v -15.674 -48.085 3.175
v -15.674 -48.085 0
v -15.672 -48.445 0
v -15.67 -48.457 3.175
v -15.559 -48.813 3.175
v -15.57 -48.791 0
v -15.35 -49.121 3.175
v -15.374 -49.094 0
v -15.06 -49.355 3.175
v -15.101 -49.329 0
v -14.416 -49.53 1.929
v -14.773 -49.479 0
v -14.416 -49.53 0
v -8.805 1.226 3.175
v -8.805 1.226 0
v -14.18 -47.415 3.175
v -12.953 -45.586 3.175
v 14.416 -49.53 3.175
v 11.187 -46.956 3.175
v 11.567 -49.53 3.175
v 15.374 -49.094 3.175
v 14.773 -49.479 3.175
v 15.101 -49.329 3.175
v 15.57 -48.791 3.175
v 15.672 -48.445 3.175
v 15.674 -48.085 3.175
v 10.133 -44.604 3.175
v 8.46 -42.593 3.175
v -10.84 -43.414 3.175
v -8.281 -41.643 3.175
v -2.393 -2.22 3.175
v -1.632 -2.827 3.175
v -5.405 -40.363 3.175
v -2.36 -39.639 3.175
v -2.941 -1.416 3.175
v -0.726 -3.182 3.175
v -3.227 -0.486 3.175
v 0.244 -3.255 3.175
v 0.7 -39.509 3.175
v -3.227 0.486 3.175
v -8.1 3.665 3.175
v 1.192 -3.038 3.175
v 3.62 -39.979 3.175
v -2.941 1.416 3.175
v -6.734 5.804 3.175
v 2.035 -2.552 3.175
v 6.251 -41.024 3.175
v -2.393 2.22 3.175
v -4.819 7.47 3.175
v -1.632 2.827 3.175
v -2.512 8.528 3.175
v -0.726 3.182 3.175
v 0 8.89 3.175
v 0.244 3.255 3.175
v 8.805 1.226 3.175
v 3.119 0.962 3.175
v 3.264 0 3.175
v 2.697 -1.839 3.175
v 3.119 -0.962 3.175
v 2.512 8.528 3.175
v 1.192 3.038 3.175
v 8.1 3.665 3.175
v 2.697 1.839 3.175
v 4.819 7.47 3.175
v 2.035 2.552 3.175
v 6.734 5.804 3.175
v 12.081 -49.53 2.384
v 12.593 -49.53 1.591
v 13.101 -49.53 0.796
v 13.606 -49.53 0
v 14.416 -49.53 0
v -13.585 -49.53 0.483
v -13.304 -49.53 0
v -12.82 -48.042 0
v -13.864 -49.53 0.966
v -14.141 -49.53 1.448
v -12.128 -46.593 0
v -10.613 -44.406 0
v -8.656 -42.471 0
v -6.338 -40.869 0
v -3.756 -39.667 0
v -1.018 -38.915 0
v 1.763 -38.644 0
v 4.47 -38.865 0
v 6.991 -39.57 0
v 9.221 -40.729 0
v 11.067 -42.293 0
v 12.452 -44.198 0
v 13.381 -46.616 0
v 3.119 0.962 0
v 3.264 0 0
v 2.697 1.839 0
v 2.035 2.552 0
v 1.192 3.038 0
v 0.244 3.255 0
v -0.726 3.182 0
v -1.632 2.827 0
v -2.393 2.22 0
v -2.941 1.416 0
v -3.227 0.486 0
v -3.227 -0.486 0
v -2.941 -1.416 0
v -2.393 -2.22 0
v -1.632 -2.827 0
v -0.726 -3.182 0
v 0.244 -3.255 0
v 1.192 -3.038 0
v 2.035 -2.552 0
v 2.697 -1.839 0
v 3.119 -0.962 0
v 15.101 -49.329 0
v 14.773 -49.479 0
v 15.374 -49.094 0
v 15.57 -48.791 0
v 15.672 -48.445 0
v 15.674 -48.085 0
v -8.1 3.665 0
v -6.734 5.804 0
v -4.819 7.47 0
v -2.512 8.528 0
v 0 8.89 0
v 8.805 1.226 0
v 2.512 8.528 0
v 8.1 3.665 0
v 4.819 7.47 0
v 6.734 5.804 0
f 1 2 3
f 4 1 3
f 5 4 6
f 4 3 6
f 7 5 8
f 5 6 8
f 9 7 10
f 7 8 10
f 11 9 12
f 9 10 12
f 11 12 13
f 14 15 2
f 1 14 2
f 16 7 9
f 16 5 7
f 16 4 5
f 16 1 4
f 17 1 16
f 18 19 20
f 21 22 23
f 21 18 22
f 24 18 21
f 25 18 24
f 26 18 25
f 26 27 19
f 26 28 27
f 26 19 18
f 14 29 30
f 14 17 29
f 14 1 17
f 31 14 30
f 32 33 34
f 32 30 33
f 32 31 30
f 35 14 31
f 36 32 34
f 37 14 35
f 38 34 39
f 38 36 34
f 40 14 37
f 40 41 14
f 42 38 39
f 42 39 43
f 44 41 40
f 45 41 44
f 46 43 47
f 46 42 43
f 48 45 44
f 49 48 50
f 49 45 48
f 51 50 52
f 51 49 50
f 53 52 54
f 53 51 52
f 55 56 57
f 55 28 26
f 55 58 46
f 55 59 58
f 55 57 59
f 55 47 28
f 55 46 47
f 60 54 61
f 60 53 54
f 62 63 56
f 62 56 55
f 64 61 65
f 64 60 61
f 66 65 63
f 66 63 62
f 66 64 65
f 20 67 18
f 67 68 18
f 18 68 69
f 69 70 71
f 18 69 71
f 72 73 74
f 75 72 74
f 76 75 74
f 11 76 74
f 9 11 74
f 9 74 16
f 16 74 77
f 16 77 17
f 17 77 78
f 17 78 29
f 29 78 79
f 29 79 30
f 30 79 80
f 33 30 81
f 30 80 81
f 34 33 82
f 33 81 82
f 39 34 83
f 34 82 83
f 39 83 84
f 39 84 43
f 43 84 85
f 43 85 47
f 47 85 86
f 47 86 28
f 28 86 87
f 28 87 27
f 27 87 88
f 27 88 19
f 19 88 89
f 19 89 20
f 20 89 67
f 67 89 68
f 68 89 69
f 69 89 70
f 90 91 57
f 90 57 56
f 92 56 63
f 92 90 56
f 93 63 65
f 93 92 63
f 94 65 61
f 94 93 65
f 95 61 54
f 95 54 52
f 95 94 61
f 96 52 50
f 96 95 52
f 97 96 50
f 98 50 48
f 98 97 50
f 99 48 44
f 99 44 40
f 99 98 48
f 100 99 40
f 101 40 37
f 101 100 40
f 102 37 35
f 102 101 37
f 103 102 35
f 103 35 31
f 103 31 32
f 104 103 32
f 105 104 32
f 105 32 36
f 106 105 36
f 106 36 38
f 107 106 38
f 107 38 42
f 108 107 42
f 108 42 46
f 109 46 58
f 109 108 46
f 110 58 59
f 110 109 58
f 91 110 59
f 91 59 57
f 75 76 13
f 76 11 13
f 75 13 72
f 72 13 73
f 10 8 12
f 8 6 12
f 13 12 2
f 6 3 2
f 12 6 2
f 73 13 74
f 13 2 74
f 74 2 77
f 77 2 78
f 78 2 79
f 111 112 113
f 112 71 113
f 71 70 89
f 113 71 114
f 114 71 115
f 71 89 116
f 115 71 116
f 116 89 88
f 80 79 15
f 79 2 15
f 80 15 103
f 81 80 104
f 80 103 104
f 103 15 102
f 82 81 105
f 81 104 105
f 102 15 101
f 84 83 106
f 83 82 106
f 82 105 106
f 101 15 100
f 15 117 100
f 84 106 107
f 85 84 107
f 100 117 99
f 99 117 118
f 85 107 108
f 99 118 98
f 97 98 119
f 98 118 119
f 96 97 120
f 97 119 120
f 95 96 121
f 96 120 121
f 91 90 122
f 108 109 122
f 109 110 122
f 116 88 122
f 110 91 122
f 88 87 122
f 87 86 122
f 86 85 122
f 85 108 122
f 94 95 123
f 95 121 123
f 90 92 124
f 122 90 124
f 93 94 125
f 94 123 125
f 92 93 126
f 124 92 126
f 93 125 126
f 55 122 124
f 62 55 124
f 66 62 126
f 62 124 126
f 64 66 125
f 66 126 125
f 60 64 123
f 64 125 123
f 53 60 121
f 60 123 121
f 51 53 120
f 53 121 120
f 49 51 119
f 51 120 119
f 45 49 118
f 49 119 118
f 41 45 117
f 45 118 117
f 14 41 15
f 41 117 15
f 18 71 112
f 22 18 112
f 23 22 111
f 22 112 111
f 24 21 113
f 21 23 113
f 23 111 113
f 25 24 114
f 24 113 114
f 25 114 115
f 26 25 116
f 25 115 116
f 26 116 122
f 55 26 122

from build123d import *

# Parameters (mm, degrees)
SKETCH1_R           = 3.2639
BOSS_EXTRUDE1_DEPTH = 3.175
CAVITY1_OUTLINE_W   = 11.43
CAVITY1_OUTLINE_H   = 18.479477922
FILLET2_R           = 1.27


# Read off the part's stored shape, not the designer's step: Cavity1
with BuildPart() as part:
    # Sketch1 → Boss-Extrude1 (new body)
    with BuildSketch(Plane.XY):
        with BuildLine():
            ThreePointArc((8.804991066, 1.226471495), (0, 8.89), (-8.804991066, 1.226471495))
            Line((-8.804991066, 1.226471495), (-15.875, -49.53))
            Line((-15.875, -49.53), (15.875, -49.53))
            Line((15.875, -49.53), (8.804991066, 1.226471495))
        make_face()
        Circle(SKETCH1_R, mode=Mode.SUBTRACT)
    extrude(amount=BOSS_EXTRUDE1_DEPTH)

    # Cavity1 outline → Cavity1 (revolve, cut)
    with BuildSketch(Plane(origin=(5.822510153, -48.093039184, -8.961753145), x_dir=(0.8468434564524782, -0.1362359794546486, 0.5140971874710584), z_dir=(0, 0.9666347575686124, 0.2561586333900735))):
        with Locations((5.715, -12.145132975)):
            Rectangle(CAVITY1_OUTLINE_W, CAVITY1_OUTLINE_H)
    revolve(axis=Axis((5.822510153, -48.093039184, -8.961753145), (0.5318422324934529, 0.21692626250019303, -0.818588319226507)), mode=Mode.SUBTRACT)

    # Fillet2
    # the kernel refuses this fillet: 1.27 mm, written as the material it takes off along each edge
    with BuildSketch(Plane(origin=(-15.875, -49.53, -3.64790796), x_dir=(0.13796079814219978, 0.990437690203663, 0), z_dir=(0, 0, 1))) as fillet2_piece_1:
        with BuildLine():
            CenterArc((FILLET2_R * 1.14894738902, -FILLET2_R), FILLET2_R, 90, 97.929863559)
            Line((FILLET2_R * 0.158509698812, -FILLET2_R * 1.13796079814), (0, 0))
            Line((0, 0), (FILLET2_R * 1.14894738902, 0))
        make_face()
    extrude(amount=10.47081592, mode=Mode.SUBTRACT)
    with BuildSketch(Plane(origin=(15.875, -49.53, -3.64790796), x_dir=(-0.1379607981421991, 0.9904376902036632, 0), z_dir=(0, 0, 1))) as fillet2_piece_2:
        with BuildLine():
            CenterArc((FILLET2_R * 1.14894738902, FILLET2_R), FILLET2_R, 172.070136441, 97.929863559)
            Line((FILLET2_R * 0.158509698812, FILLET2_R * 1.13796079814), (0, 0))
            Line((0, 0), (FILLET2_R * 1.14894738902, 0))
        make_face()
    extrude(amount=10.47081592, mode=Mode.SUBTRACT)


solid = part.part
